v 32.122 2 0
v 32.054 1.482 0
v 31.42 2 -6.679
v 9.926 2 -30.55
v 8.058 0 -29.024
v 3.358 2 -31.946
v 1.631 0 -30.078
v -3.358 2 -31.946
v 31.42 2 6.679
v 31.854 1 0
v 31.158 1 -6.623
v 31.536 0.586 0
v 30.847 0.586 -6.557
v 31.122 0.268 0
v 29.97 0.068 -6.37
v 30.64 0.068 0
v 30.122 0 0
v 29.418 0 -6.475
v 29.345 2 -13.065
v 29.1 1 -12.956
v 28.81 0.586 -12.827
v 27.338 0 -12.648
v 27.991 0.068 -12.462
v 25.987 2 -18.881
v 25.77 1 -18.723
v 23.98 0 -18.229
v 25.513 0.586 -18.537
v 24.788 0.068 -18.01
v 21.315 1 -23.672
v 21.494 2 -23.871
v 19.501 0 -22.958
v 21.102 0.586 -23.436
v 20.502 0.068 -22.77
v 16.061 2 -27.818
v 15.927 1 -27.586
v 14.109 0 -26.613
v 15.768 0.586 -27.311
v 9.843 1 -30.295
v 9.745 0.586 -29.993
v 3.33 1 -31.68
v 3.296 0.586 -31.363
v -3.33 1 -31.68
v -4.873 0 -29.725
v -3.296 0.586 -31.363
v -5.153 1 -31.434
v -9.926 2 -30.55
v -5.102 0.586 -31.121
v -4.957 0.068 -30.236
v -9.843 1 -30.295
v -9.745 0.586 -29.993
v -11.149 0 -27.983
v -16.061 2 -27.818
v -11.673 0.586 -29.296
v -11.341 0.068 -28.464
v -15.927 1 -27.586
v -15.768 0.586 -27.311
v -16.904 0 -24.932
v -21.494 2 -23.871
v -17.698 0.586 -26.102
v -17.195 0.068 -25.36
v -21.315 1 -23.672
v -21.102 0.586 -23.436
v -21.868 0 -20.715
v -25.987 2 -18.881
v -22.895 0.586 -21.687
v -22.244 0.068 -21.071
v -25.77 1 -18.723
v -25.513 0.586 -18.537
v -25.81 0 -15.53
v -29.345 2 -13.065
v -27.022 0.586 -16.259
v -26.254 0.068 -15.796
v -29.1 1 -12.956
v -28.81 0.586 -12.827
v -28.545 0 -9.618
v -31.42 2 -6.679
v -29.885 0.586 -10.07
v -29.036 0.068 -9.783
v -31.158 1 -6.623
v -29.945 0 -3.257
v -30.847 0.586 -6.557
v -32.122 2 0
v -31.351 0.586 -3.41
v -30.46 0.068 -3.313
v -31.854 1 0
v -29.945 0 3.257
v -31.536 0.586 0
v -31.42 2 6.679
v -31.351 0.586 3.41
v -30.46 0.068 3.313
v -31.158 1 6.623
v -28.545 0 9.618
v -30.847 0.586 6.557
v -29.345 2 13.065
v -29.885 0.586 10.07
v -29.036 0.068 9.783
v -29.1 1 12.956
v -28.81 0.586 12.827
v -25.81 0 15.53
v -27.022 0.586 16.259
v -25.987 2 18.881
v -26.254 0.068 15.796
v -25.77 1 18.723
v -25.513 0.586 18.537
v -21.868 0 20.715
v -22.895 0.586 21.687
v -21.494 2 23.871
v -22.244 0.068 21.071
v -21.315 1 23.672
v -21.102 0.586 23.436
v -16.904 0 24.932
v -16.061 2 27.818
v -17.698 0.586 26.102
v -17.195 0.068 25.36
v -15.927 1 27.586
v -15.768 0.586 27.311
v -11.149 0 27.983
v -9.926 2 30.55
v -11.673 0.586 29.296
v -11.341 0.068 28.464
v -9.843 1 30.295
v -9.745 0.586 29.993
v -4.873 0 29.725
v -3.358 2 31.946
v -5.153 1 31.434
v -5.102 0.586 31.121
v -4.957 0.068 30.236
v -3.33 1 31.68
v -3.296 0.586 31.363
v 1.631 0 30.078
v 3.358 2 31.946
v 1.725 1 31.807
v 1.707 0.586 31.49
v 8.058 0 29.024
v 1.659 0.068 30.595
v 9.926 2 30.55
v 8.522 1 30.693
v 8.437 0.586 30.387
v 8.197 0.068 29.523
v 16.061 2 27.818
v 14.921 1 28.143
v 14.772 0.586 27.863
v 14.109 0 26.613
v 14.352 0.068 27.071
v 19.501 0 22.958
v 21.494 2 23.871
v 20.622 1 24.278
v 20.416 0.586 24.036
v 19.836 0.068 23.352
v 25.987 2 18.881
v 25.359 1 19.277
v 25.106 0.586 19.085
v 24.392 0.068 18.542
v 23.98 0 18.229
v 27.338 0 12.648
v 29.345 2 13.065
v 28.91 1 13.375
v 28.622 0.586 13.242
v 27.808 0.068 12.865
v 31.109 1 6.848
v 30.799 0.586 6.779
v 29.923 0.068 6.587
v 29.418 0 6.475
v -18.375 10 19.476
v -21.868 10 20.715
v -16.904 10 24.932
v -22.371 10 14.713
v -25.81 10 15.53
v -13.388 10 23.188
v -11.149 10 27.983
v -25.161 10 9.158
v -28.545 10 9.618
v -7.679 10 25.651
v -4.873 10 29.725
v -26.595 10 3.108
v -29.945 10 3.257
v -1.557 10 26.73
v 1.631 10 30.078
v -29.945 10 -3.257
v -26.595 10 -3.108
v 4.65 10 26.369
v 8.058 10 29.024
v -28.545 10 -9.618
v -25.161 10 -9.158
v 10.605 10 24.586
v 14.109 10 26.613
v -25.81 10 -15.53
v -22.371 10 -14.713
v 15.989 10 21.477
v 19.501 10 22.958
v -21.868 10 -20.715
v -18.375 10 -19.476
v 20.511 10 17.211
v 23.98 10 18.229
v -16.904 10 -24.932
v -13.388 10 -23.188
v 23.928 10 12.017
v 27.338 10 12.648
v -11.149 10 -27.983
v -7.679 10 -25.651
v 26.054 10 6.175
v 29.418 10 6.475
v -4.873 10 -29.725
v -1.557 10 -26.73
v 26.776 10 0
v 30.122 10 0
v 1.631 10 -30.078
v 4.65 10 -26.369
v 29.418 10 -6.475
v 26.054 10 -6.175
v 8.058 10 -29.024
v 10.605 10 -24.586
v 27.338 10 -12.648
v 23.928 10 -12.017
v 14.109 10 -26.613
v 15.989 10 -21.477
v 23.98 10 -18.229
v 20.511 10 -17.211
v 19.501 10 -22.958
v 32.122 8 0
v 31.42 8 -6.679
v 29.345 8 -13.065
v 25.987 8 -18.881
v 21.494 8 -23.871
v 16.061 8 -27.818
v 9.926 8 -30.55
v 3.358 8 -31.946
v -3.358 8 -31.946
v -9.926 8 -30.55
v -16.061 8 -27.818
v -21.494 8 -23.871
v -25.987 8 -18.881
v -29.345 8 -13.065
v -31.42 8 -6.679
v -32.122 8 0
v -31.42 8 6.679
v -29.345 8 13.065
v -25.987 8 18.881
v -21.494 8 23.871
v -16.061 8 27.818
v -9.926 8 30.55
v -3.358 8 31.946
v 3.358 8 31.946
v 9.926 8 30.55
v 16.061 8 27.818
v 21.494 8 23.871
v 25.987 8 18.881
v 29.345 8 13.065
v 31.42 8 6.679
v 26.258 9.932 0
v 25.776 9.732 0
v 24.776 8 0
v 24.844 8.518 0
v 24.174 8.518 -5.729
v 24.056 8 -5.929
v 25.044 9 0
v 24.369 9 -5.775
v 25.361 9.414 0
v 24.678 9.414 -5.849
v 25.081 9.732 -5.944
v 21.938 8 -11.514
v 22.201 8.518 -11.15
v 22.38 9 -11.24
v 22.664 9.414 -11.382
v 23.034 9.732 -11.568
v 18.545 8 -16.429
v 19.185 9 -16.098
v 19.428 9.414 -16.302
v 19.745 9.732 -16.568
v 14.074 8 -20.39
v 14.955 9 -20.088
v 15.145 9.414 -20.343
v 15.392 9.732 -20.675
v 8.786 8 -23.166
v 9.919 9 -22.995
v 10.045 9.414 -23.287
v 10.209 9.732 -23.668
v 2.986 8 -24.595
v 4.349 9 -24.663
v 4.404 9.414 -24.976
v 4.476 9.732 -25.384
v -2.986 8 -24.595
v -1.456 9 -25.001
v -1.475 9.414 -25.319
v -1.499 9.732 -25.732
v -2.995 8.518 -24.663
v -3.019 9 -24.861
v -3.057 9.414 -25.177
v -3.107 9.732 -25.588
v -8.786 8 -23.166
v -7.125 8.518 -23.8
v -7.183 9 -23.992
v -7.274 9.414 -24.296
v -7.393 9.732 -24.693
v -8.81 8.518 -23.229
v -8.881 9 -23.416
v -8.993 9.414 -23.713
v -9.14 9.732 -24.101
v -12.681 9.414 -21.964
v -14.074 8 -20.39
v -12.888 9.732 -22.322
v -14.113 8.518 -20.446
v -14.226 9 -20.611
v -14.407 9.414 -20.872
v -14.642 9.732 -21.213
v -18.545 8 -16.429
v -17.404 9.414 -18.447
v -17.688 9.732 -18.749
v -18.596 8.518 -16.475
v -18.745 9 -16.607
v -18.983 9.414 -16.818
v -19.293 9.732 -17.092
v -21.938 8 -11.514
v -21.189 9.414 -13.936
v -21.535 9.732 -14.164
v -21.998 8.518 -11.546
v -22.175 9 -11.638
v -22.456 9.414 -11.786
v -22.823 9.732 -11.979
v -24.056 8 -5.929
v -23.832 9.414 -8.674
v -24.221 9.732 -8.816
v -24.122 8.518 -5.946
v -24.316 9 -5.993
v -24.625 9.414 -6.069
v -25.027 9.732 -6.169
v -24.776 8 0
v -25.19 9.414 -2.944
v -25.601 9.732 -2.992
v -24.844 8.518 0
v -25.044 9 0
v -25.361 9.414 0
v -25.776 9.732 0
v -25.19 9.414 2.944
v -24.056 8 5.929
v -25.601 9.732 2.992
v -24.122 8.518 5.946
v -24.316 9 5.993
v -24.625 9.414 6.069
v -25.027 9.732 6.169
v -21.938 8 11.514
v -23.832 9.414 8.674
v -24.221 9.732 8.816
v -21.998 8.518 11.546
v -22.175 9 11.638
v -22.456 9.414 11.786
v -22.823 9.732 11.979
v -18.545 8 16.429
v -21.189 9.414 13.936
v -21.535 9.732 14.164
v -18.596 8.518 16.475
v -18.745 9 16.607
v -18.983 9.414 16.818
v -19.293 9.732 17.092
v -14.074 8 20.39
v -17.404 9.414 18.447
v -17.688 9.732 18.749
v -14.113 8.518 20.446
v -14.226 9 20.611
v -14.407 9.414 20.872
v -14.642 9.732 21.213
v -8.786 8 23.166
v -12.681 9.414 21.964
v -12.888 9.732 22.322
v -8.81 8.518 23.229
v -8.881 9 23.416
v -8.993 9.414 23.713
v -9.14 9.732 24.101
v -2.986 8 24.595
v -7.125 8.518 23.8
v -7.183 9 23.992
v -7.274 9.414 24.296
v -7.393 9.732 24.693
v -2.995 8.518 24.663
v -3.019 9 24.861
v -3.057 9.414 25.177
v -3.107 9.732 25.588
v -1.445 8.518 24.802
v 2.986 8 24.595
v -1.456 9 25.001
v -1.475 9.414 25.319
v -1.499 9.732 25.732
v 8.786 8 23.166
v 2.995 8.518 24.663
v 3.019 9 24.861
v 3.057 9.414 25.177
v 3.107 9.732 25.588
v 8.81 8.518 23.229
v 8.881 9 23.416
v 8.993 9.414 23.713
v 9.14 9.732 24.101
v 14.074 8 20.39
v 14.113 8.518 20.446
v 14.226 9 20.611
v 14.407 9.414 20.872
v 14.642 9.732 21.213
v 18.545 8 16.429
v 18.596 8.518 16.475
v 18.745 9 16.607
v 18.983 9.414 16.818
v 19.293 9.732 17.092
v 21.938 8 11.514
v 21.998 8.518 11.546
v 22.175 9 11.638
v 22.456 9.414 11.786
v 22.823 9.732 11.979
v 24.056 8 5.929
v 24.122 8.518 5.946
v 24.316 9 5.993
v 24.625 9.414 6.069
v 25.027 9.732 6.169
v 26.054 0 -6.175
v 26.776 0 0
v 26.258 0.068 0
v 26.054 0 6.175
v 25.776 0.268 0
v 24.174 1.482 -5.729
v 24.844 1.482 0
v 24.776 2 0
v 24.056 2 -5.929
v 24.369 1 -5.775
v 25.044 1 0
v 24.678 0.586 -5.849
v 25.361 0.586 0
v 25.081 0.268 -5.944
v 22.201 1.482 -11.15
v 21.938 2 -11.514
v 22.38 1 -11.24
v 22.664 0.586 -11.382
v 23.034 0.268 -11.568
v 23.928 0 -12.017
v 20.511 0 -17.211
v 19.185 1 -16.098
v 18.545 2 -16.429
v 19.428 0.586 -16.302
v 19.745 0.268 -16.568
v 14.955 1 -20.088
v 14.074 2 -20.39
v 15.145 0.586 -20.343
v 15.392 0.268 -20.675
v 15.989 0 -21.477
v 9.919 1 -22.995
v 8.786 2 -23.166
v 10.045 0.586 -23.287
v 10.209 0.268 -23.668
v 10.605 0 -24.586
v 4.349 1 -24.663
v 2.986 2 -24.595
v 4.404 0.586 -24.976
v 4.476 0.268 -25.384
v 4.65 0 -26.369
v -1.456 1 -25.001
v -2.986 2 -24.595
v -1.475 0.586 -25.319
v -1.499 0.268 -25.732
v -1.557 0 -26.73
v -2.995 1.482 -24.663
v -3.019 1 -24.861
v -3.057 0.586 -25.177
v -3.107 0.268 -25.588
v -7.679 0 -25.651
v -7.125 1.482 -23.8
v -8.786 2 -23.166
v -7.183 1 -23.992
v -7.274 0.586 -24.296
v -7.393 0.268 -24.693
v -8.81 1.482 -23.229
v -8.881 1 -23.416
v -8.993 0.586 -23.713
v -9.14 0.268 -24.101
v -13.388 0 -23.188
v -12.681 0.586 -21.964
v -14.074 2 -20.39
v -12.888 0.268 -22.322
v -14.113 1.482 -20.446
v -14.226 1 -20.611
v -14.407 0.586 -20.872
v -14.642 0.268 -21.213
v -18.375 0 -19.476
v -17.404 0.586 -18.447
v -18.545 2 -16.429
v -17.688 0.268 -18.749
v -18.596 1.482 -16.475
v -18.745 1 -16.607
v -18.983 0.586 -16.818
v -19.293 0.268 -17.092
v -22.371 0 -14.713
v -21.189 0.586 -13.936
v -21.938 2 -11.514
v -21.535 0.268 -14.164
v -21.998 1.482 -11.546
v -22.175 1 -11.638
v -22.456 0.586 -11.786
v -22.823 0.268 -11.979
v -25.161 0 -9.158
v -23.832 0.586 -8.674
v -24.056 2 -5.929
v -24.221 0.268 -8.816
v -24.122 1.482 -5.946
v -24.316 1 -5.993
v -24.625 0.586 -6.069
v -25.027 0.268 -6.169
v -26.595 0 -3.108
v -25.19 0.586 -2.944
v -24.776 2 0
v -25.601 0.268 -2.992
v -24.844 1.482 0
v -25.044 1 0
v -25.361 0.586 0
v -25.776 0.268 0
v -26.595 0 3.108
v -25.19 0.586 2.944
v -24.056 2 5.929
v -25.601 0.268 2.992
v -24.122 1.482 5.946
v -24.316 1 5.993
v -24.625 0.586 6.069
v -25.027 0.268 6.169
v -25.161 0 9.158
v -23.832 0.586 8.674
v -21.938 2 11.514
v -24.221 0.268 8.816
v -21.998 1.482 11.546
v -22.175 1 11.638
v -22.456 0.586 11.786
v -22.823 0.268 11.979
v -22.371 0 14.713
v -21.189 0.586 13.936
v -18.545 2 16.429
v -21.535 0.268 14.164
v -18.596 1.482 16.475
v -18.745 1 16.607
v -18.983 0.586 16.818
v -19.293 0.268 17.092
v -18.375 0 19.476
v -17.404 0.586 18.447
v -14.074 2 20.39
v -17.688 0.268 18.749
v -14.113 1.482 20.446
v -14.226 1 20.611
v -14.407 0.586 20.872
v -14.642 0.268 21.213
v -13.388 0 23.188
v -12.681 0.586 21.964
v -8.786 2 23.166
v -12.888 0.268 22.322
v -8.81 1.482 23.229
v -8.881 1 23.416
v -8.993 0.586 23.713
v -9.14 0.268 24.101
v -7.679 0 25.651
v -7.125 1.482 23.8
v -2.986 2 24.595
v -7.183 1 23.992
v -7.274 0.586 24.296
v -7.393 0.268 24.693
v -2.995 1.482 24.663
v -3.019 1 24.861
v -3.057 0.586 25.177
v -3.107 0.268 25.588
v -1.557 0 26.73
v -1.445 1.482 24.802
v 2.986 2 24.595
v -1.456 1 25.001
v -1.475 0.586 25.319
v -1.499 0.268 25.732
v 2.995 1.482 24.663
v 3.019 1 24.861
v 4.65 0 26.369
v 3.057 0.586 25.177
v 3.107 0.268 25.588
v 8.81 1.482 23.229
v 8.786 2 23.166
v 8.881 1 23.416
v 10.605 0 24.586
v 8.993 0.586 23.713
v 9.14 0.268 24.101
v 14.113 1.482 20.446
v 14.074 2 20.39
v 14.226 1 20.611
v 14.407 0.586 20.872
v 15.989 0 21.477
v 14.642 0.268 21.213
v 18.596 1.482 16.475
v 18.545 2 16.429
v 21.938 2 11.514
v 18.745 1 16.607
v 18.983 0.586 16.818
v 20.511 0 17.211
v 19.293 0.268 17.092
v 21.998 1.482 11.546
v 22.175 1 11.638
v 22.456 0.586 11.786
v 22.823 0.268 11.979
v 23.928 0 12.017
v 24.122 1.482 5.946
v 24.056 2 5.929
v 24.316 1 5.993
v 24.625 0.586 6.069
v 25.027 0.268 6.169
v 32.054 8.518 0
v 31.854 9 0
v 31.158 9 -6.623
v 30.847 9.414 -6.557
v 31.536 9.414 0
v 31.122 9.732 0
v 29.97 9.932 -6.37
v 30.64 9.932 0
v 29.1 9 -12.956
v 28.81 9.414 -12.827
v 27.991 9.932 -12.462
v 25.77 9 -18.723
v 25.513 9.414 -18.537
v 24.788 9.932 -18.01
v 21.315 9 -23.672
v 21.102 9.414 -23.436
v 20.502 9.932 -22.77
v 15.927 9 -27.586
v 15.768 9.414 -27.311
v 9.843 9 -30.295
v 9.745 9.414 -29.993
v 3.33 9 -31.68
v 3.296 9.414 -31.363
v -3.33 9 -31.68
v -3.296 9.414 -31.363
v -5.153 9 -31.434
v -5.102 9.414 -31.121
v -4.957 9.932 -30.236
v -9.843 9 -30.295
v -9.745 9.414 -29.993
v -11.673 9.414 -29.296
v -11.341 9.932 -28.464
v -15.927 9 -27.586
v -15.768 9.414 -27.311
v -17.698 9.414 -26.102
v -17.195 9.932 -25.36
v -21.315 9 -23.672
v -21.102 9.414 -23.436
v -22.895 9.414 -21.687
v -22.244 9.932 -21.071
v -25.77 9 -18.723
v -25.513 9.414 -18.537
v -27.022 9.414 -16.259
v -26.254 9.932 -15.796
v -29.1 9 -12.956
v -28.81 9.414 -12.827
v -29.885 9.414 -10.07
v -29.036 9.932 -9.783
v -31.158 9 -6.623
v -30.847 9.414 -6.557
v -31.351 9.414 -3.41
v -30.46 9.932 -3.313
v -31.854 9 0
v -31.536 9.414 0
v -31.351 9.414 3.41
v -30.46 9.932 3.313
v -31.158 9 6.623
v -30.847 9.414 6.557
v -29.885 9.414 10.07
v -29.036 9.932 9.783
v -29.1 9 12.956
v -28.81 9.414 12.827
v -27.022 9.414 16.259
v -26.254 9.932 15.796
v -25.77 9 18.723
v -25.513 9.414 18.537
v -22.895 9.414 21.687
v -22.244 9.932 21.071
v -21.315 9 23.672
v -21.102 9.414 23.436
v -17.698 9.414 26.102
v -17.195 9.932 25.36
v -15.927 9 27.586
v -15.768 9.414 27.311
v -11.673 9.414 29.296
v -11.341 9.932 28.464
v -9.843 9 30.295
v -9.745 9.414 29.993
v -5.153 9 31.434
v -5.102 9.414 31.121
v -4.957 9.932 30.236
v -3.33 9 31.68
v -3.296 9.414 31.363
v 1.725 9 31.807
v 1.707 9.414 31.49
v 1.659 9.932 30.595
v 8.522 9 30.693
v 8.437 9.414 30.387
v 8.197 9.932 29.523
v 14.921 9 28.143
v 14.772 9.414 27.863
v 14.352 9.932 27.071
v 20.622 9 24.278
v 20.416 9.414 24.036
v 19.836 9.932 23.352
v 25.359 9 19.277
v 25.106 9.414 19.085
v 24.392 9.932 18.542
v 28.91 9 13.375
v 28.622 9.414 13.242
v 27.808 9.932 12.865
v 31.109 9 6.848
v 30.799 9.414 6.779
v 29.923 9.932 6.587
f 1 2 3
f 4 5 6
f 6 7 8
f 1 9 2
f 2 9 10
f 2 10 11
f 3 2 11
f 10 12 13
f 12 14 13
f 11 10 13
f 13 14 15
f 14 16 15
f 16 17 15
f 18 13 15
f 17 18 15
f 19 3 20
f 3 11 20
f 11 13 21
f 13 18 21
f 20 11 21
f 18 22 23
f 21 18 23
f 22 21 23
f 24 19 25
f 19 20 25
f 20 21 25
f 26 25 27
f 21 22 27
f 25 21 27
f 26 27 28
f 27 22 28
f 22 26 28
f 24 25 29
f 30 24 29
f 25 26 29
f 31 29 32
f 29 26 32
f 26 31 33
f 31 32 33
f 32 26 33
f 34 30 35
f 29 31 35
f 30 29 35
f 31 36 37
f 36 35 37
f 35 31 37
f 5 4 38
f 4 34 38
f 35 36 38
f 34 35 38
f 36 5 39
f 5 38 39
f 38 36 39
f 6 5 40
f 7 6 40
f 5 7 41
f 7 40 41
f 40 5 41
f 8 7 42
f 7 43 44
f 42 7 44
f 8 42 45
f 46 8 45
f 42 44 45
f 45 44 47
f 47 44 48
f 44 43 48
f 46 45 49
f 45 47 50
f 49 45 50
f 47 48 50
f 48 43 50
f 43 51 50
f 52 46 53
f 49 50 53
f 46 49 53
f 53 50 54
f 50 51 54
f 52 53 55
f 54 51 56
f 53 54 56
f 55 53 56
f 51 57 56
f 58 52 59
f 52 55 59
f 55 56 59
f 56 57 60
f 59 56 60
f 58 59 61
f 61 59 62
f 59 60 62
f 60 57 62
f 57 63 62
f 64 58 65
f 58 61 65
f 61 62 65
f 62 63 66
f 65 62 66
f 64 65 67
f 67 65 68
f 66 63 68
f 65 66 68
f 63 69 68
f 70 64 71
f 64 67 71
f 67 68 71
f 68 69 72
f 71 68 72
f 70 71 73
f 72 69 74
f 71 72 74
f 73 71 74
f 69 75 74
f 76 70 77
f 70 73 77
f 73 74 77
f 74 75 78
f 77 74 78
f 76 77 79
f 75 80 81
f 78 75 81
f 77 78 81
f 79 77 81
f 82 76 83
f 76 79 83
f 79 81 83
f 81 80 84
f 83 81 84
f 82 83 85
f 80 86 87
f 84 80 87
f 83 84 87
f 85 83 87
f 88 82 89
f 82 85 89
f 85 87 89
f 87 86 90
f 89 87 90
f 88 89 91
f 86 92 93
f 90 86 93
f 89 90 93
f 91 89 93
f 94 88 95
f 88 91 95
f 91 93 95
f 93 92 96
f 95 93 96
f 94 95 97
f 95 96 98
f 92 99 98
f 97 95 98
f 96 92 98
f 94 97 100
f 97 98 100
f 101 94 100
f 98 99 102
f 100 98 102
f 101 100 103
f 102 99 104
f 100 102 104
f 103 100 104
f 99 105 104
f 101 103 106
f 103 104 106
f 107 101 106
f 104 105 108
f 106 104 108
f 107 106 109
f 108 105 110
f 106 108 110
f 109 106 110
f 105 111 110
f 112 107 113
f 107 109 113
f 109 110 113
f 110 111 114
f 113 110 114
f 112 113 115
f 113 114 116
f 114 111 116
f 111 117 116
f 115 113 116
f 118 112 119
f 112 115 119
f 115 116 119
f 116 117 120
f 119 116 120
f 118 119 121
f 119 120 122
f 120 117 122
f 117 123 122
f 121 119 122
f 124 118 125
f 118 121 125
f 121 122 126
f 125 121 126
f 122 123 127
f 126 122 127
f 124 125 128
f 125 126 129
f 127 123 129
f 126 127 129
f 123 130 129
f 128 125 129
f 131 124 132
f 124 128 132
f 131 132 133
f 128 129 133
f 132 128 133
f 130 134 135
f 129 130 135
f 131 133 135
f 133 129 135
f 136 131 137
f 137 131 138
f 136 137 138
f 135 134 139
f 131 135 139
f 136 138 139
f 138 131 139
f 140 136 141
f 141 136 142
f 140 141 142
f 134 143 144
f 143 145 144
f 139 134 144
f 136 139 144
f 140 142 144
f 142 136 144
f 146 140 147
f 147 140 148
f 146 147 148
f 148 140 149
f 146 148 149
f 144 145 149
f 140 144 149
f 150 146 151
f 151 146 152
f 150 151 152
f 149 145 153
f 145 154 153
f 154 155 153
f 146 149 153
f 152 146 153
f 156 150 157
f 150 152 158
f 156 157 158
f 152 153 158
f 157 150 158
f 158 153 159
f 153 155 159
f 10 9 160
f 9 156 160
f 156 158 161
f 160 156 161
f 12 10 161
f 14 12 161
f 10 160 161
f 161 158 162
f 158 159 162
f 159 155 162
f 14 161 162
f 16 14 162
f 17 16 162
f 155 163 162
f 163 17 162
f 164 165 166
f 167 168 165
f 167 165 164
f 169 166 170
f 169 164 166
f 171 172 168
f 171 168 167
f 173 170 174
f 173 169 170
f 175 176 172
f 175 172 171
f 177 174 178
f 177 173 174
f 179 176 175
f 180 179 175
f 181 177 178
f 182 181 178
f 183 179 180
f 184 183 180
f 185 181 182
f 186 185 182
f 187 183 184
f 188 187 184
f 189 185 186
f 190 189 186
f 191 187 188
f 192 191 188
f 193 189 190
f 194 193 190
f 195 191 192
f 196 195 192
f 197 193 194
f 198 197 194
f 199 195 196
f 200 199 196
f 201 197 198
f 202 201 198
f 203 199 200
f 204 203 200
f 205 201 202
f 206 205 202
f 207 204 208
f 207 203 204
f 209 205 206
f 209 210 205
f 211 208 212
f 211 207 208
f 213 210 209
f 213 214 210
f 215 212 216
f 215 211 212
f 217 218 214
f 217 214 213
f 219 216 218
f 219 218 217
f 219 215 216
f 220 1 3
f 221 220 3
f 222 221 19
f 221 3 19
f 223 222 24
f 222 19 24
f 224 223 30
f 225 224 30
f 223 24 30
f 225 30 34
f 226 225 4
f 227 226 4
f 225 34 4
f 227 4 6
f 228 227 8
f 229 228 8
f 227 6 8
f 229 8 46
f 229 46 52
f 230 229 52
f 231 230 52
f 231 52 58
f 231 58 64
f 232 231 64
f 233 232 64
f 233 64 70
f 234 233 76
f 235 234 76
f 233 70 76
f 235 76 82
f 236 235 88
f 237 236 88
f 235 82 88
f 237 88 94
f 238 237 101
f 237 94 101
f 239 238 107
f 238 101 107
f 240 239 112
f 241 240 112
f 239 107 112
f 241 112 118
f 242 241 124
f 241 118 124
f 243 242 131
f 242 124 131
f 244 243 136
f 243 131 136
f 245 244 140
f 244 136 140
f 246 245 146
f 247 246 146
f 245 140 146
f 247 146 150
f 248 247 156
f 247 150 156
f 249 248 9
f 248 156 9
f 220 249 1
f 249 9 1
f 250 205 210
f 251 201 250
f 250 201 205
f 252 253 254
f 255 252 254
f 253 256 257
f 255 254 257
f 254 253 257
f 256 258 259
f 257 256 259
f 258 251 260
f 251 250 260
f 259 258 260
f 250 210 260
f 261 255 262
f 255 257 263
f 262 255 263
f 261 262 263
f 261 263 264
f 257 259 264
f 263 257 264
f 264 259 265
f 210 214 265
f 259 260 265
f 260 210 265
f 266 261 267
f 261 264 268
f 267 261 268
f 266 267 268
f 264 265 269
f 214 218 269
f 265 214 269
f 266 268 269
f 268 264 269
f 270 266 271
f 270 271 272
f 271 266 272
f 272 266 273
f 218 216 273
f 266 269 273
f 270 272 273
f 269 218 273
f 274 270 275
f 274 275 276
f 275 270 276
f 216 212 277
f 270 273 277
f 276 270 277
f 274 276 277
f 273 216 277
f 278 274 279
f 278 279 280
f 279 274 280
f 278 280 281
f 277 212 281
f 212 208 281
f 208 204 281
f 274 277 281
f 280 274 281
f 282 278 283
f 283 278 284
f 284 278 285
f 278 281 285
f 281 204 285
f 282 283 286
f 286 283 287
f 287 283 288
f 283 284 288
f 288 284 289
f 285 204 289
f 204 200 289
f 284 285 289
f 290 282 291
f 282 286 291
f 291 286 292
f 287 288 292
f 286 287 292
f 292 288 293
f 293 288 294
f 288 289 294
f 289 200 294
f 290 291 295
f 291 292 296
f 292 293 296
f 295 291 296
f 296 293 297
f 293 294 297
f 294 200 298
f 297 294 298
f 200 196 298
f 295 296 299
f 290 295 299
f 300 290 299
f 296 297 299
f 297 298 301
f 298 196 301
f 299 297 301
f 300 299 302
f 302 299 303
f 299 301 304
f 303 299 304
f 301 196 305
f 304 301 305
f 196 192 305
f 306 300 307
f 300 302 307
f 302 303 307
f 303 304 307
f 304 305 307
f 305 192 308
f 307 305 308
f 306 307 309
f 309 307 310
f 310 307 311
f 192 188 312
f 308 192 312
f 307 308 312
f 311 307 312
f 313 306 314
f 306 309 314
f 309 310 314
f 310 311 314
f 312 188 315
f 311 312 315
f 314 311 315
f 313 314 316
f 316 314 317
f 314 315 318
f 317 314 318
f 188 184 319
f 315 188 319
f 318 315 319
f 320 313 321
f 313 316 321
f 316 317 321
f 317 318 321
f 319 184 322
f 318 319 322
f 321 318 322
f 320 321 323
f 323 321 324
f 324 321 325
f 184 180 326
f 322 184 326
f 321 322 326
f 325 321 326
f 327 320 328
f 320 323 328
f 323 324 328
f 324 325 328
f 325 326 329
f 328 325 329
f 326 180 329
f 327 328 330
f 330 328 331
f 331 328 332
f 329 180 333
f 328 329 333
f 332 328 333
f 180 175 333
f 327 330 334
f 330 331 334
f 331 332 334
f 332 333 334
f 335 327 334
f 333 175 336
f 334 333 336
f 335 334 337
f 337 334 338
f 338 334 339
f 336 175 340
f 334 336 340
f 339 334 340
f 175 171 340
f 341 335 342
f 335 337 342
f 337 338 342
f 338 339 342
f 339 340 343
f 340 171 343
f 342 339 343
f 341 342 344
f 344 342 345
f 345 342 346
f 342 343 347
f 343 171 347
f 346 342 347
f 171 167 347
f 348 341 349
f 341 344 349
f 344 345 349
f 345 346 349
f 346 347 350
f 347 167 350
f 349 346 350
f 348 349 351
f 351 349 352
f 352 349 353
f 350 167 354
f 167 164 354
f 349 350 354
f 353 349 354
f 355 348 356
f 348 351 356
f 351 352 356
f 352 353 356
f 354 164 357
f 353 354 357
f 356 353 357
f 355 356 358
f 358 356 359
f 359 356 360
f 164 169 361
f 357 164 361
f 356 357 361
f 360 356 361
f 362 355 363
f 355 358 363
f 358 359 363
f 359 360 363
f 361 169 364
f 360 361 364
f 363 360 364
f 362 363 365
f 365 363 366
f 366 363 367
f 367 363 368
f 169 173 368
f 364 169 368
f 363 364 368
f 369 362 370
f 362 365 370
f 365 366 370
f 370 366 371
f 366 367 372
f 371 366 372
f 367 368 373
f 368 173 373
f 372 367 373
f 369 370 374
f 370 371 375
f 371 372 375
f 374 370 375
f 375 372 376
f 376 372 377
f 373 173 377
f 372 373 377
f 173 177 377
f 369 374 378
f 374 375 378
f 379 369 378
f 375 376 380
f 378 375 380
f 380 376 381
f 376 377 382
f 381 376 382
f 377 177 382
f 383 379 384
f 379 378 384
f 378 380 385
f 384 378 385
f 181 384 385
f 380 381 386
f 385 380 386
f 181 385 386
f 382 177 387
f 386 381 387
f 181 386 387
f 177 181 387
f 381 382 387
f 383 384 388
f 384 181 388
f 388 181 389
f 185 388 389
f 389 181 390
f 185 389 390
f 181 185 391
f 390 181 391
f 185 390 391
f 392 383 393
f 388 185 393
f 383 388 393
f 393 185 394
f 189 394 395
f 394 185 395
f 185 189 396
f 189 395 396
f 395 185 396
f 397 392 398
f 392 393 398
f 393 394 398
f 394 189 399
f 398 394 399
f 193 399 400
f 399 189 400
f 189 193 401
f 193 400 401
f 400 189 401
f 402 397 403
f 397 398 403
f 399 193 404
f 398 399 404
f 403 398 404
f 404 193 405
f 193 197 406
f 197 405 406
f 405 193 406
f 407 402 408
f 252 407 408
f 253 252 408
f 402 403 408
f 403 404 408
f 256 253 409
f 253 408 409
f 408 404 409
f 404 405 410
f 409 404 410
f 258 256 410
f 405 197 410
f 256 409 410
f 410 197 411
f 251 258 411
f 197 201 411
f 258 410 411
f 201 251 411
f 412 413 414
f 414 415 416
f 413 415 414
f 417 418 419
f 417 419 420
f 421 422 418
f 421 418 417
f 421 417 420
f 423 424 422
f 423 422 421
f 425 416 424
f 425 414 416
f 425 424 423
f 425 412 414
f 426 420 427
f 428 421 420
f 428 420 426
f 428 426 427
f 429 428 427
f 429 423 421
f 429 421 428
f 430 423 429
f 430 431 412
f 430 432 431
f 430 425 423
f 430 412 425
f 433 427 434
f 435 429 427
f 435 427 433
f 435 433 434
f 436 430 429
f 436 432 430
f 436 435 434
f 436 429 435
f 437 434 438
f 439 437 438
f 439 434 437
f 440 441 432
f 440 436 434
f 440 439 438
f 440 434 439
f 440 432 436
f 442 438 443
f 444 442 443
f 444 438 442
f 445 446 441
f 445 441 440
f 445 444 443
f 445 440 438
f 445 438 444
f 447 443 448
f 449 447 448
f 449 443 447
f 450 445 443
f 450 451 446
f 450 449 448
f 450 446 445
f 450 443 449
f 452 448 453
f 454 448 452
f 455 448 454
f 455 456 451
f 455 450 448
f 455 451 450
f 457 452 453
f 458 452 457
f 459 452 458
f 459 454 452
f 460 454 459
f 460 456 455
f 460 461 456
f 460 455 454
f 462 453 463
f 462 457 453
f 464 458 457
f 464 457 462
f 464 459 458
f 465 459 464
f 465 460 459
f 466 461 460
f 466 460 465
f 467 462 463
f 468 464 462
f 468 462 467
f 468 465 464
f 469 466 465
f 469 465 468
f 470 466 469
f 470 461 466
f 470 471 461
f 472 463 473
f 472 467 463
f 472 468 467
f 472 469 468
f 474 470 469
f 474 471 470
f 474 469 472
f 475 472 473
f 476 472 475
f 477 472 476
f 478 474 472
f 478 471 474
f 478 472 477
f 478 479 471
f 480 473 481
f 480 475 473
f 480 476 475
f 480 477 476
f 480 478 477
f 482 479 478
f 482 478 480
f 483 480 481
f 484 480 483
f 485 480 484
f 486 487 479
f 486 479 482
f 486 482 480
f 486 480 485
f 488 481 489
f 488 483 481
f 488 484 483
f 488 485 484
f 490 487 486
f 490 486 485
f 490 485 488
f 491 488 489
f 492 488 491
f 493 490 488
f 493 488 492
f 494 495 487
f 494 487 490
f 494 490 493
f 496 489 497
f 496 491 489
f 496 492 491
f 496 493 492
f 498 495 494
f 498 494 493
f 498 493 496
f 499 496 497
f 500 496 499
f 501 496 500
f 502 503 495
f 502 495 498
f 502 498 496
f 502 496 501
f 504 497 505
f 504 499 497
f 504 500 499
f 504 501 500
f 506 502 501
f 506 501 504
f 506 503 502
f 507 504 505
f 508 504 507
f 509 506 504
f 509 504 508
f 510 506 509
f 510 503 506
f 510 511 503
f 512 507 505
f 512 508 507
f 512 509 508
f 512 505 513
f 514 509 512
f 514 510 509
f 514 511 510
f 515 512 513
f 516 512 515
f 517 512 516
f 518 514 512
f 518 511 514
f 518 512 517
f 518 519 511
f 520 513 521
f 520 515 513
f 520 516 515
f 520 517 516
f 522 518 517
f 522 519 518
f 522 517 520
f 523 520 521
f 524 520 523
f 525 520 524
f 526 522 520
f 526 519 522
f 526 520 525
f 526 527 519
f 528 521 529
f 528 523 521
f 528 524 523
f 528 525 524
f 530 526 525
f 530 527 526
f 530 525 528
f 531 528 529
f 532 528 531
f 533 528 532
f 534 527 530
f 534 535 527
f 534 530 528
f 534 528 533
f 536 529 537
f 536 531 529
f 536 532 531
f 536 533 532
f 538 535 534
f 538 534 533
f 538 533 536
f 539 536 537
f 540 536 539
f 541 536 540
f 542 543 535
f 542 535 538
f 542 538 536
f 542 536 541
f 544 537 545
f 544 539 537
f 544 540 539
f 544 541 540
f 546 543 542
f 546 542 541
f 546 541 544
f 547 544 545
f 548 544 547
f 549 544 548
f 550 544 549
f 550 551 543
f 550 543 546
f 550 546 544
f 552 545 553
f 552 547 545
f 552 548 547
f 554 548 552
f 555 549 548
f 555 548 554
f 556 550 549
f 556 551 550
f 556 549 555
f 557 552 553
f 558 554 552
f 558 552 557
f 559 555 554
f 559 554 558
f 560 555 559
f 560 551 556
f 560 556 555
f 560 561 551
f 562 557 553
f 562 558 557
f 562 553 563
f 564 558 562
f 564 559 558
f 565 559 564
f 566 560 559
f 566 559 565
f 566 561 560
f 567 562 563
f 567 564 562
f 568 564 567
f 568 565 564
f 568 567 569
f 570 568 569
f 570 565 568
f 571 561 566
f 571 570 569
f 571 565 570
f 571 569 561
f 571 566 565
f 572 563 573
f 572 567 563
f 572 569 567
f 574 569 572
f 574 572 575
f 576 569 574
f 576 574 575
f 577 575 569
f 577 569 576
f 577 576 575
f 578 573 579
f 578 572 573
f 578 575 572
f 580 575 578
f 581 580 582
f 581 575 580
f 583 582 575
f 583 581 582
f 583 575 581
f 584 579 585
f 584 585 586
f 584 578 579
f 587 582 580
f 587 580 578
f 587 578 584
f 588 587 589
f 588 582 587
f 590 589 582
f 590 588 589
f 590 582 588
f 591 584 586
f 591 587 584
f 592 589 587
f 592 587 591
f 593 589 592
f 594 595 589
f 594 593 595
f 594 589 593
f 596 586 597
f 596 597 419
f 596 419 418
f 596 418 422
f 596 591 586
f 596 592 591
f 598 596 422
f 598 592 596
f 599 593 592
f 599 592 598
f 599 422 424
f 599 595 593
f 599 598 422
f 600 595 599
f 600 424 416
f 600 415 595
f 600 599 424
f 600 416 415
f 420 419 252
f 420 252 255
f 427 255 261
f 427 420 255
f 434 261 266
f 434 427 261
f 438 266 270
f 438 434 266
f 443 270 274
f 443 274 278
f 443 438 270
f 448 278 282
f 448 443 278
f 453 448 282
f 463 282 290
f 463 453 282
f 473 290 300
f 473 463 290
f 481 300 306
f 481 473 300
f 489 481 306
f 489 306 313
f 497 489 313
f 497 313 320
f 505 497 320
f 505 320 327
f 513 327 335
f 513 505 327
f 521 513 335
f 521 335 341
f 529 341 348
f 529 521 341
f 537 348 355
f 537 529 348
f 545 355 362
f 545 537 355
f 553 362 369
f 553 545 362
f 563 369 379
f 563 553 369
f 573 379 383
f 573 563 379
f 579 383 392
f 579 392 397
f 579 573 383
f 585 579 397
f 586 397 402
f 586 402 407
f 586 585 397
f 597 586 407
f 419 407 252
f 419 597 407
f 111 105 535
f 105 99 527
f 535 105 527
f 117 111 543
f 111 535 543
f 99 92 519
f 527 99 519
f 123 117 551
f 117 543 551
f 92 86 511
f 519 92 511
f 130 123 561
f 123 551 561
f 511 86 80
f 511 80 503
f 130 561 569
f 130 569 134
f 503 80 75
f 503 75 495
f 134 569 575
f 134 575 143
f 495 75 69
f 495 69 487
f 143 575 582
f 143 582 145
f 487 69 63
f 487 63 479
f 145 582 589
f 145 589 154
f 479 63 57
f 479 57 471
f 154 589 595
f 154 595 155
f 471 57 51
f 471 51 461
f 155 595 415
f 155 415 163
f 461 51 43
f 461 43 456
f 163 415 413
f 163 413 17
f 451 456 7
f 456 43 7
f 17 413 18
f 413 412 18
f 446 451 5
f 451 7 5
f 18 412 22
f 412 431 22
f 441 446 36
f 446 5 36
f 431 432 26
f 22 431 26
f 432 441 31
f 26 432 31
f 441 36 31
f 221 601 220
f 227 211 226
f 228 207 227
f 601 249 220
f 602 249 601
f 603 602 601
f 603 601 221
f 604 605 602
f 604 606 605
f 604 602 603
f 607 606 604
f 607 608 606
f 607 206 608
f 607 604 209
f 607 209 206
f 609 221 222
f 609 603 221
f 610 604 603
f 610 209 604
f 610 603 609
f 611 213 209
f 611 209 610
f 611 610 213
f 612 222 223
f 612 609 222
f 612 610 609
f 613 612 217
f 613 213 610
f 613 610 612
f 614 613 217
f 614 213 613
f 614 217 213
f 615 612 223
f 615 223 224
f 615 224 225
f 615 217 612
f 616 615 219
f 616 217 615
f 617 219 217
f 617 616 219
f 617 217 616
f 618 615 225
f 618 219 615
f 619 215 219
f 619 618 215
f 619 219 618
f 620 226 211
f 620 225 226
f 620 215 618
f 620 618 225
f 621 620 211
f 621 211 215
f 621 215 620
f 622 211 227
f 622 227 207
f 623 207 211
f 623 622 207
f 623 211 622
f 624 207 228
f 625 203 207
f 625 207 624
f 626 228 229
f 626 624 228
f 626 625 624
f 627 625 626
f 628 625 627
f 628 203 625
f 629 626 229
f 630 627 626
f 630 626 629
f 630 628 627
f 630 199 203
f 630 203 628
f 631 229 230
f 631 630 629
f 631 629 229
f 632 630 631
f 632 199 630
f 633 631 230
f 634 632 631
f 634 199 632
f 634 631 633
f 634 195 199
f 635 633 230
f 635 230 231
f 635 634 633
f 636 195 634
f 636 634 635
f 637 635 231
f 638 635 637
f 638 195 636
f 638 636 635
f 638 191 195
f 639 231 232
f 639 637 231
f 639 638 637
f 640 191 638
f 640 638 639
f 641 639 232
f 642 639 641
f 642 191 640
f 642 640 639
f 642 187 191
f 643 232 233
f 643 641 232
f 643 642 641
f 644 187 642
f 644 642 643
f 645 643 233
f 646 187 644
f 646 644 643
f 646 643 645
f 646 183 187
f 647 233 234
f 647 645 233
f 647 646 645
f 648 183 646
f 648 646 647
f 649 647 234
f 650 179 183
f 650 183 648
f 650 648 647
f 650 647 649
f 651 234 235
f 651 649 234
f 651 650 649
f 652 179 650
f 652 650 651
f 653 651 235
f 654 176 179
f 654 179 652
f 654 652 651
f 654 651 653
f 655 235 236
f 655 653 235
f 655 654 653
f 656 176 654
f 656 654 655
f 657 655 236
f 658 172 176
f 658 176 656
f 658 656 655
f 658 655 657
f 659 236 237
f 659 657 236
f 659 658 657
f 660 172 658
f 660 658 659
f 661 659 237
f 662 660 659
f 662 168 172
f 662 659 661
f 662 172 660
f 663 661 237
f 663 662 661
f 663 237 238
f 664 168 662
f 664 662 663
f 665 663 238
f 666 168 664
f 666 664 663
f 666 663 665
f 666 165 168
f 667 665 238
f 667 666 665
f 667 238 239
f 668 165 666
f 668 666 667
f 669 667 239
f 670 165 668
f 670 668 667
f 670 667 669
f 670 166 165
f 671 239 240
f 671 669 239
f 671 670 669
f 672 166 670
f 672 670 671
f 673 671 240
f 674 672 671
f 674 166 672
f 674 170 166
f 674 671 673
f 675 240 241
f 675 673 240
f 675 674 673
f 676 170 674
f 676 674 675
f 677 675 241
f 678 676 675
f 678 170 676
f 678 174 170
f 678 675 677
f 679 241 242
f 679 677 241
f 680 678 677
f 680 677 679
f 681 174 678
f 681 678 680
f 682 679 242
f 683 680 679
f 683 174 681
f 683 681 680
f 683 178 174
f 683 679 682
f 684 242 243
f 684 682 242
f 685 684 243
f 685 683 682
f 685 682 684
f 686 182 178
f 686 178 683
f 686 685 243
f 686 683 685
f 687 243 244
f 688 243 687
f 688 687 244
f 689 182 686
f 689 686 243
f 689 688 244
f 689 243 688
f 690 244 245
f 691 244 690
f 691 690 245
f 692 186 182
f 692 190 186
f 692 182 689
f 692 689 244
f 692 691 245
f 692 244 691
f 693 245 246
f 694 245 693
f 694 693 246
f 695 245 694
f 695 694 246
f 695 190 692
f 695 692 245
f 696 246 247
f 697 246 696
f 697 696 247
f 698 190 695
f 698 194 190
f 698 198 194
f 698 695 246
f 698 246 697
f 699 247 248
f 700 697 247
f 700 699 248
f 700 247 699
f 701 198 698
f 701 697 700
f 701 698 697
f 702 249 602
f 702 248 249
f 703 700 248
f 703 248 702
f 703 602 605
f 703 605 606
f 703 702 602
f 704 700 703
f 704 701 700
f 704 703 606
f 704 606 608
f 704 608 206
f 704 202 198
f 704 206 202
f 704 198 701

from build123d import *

# Parameters (mm, degrees)
SKETCH1_R      = 32.122013297
SKETCH1_R_2    = 24.775693006
EXTRUDE1_DEPTH = 10
FILLET1_R      = 2


with BuildPart() as part:
    # Sketch1 → Extrude1 (new body)
    with BuildSketch(Plane(origin=(0, 0, 0), x_dir=(1, 0, 0), z_dir=(0, 1, 0))):
        Circle(SKETCH1_R)
        Circle(SKETCH1_R_2, mode=Mode.SUBTRACT)
    extrude(amount=EXTRUDE1_DEPTH)

    # Fillet1
    fillet1_edges = [part.edges().sort_by_distance(p)[0] for p in [
        (-32.122013297, 0, 0),
        (-32.122013297, 10, 0),
        (-24.775693006, 0, 0),
        (-24.775693006, 10, 0),
    ]]
    fillet(fillet1_edges, radius=FILLET1_R)


solid = part.part
